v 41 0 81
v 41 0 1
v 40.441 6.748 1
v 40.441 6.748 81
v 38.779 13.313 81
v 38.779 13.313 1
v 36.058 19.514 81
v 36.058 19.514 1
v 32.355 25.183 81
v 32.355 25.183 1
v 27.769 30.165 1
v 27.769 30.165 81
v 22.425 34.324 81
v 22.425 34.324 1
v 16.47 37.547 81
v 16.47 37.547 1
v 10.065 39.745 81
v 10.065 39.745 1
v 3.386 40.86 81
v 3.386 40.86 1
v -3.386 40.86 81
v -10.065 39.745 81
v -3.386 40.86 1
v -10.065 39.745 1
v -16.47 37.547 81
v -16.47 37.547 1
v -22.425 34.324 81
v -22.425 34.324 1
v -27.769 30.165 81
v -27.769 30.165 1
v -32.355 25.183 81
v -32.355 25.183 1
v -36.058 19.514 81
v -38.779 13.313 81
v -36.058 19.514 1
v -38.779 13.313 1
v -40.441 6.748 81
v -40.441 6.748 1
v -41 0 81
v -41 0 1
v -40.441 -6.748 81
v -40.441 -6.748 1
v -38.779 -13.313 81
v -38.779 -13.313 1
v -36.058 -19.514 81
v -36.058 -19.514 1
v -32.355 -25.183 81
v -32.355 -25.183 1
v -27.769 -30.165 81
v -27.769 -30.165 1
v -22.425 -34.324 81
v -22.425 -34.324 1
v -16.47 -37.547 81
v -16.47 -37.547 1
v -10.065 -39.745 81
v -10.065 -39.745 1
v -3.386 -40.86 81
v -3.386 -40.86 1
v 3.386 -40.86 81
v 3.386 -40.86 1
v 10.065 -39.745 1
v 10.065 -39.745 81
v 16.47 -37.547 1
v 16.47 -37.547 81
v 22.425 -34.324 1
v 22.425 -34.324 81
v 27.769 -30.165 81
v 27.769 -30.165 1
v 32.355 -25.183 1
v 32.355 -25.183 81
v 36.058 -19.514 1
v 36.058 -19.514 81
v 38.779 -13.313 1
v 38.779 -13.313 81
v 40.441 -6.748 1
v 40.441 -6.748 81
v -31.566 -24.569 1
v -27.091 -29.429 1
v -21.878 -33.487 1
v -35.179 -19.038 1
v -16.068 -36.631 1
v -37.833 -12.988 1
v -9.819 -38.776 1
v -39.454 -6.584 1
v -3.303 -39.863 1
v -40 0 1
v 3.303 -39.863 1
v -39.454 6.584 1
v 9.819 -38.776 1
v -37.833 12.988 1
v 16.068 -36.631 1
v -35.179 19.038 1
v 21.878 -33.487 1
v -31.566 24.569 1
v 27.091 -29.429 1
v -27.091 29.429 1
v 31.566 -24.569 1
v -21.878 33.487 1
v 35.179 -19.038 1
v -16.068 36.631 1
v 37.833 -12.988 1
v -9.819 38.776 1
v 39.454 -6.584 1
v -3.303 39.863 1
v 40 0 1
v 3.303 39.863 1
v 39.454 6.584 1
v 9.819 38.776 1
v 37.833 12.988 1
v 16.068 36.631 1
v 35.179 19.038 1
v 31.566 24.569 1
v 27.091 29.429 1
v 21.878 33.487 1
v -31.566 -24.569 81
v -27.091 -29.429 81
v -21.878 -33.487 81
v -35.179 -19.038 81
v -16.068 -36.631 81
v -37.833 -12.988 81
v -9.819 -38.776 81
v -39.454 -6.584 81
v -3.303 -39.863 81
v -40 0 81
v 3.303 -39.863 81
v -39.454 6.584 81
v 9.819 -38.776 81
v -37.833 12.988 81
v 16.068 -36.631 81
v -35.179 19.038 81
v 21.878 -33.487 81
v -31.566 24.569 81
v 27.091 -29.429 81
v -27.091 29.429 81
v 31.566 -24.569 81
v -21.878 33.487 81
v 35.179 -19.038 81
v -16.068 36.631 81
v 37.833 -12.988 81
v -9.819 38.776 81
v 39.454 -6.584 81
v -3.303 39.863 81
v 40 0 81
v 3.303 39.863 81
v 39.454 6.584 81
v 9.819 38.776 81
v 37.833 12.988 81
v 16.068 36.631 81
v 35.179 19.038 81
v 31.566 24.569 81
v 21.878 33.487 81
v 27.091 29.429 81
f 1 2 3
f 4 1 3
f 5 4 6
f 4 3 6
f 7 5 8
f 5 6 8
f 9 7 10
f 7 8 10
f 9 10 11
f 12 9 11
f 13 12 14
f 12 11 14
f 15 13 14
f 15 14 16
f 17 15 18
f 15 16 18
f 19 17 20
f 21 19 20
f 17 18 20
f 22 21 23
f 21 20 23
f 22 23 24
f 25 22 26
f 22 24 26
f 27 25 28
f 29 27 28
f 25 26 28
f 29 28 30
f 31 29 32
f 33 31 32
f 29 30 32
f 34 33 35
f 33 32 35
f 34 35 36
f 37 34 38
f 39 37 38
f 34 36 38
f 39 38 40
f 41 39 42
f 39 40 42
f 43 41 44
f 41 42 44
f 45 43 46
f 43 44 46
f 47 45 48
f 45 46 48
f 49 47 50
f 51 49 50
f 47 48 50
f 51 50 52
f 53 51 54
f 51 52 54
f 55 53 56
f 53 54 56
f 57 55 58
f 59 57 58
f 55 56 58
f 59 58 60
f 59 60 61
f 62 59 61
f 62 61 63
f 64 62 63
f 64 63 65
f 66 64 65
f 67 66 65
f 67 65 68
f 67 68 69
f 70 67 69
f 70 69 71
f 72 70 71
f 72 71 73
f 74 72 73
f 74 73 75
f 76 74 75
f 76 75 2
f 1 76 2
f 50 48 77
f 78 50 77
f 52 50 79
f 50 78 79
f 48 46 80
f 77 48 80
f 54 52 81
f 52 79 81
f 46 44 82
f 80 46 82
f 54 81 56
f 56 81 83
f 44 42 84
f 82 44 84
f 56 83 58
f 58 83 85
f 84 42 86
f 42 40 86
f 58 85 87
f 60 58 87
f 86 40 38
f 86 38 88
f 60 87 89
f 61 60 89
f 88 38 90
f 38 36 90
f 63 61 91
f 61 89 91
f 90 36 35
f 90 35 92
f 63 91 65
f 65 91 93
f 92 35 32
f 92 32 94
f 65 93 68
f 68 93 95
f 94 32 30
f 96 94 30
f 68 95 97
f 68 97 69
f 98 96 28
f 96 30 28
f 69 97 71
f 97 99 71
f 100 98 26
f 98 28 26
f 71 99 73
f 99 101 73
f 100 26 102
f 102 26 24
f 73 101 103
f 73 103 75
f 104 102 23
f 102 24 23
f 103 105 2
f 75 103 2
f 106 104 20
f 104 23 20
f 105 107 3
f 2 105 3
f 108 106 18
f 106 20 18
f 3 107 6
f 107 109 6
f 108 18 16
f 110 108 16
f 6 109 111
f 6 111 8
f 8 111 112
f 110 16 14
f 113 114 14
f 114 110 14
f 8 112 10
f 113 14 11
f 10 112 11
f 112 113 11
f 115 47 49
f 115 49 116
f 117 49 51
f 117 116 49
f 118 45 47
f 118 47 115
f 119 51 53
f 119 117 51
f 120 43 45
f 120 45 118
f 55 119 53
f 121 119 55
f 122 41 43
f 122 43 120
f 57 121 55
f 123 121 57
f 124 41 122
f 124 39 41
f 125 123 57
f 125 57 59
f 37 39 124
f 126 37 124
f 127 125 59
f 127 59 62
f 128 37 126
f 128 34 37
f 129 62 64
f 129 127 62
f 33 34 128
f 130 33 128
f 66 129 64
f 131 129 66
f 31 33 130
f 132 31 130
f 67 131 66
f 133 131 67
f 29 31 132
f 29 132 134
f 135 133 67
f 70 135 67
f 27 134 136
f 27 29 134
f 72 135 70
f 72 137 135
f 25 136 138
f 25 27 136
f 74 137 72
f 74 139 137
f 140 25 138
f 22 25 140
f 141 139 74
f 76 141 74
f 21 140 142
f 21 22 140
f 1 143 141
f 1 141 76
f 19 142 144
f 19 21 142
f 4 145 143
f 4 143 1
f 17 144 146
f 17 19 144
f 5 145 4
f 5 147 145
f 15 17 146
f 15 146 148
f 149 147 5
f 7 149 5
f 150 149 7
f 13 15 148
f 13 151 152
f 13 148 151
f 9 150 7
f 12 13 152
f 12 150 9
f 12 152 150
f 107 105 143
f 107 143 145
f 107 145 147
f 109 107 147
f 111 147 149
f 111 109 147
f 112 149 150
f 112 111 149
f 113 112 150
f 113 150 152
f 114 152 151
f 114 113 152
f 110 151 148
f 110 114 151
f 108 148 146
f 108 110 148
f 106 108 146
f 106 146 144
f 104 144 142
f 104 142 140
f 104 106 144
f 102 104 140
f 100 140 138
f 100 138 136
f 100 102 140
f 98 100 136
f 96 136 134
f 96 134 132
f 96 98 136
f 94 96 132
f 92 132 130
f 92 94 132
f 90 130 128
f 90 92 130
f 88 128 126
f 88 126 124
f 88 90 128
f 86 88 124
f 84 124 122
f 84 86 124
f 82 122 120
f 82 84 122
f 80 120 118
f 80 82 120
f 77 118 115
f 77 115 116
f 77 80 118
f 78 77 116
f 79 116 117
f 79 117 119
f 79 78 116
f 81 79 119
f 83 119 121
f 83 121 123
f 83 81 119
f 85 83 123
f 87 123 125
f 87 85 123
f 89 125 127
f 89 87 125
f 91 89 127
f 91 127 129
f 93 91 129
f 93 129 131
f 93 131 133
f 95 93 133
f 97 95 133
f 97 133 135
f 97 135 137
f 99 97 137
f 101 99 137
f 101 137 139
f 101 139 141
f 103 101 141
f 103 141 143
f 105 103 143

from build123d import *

# Parameters (mm, degrees)
CYLINDER016_R     = 40
CYLINDER016_DEPTH = 80
CYLINDER017_R     = 41
CYLINDER017_DEPTH = 80


with BuildPart() as cylinder016:
    # Cylinder016 → Cylinder016 (new body)
    with BuildSketch(Plane.XY.offset(1)):
        Circle(CYLINDER016_R)
    extrude(amount=CYLINDER016_DEPTH)


with BuildPart() as cut004:
    # Cylinder017 → Cylinder017 (new body)
    with BuildSketch(Plane.XY.offset(1)):
        Circle(CYLINDER017_R)
    extrude(amount=CYLINDER017_DEPTH)

    # Cut004: cut Cylinder016
    add(cylinder016.part, mode=Mode.SUBTRACT)


solid = cut004.part
